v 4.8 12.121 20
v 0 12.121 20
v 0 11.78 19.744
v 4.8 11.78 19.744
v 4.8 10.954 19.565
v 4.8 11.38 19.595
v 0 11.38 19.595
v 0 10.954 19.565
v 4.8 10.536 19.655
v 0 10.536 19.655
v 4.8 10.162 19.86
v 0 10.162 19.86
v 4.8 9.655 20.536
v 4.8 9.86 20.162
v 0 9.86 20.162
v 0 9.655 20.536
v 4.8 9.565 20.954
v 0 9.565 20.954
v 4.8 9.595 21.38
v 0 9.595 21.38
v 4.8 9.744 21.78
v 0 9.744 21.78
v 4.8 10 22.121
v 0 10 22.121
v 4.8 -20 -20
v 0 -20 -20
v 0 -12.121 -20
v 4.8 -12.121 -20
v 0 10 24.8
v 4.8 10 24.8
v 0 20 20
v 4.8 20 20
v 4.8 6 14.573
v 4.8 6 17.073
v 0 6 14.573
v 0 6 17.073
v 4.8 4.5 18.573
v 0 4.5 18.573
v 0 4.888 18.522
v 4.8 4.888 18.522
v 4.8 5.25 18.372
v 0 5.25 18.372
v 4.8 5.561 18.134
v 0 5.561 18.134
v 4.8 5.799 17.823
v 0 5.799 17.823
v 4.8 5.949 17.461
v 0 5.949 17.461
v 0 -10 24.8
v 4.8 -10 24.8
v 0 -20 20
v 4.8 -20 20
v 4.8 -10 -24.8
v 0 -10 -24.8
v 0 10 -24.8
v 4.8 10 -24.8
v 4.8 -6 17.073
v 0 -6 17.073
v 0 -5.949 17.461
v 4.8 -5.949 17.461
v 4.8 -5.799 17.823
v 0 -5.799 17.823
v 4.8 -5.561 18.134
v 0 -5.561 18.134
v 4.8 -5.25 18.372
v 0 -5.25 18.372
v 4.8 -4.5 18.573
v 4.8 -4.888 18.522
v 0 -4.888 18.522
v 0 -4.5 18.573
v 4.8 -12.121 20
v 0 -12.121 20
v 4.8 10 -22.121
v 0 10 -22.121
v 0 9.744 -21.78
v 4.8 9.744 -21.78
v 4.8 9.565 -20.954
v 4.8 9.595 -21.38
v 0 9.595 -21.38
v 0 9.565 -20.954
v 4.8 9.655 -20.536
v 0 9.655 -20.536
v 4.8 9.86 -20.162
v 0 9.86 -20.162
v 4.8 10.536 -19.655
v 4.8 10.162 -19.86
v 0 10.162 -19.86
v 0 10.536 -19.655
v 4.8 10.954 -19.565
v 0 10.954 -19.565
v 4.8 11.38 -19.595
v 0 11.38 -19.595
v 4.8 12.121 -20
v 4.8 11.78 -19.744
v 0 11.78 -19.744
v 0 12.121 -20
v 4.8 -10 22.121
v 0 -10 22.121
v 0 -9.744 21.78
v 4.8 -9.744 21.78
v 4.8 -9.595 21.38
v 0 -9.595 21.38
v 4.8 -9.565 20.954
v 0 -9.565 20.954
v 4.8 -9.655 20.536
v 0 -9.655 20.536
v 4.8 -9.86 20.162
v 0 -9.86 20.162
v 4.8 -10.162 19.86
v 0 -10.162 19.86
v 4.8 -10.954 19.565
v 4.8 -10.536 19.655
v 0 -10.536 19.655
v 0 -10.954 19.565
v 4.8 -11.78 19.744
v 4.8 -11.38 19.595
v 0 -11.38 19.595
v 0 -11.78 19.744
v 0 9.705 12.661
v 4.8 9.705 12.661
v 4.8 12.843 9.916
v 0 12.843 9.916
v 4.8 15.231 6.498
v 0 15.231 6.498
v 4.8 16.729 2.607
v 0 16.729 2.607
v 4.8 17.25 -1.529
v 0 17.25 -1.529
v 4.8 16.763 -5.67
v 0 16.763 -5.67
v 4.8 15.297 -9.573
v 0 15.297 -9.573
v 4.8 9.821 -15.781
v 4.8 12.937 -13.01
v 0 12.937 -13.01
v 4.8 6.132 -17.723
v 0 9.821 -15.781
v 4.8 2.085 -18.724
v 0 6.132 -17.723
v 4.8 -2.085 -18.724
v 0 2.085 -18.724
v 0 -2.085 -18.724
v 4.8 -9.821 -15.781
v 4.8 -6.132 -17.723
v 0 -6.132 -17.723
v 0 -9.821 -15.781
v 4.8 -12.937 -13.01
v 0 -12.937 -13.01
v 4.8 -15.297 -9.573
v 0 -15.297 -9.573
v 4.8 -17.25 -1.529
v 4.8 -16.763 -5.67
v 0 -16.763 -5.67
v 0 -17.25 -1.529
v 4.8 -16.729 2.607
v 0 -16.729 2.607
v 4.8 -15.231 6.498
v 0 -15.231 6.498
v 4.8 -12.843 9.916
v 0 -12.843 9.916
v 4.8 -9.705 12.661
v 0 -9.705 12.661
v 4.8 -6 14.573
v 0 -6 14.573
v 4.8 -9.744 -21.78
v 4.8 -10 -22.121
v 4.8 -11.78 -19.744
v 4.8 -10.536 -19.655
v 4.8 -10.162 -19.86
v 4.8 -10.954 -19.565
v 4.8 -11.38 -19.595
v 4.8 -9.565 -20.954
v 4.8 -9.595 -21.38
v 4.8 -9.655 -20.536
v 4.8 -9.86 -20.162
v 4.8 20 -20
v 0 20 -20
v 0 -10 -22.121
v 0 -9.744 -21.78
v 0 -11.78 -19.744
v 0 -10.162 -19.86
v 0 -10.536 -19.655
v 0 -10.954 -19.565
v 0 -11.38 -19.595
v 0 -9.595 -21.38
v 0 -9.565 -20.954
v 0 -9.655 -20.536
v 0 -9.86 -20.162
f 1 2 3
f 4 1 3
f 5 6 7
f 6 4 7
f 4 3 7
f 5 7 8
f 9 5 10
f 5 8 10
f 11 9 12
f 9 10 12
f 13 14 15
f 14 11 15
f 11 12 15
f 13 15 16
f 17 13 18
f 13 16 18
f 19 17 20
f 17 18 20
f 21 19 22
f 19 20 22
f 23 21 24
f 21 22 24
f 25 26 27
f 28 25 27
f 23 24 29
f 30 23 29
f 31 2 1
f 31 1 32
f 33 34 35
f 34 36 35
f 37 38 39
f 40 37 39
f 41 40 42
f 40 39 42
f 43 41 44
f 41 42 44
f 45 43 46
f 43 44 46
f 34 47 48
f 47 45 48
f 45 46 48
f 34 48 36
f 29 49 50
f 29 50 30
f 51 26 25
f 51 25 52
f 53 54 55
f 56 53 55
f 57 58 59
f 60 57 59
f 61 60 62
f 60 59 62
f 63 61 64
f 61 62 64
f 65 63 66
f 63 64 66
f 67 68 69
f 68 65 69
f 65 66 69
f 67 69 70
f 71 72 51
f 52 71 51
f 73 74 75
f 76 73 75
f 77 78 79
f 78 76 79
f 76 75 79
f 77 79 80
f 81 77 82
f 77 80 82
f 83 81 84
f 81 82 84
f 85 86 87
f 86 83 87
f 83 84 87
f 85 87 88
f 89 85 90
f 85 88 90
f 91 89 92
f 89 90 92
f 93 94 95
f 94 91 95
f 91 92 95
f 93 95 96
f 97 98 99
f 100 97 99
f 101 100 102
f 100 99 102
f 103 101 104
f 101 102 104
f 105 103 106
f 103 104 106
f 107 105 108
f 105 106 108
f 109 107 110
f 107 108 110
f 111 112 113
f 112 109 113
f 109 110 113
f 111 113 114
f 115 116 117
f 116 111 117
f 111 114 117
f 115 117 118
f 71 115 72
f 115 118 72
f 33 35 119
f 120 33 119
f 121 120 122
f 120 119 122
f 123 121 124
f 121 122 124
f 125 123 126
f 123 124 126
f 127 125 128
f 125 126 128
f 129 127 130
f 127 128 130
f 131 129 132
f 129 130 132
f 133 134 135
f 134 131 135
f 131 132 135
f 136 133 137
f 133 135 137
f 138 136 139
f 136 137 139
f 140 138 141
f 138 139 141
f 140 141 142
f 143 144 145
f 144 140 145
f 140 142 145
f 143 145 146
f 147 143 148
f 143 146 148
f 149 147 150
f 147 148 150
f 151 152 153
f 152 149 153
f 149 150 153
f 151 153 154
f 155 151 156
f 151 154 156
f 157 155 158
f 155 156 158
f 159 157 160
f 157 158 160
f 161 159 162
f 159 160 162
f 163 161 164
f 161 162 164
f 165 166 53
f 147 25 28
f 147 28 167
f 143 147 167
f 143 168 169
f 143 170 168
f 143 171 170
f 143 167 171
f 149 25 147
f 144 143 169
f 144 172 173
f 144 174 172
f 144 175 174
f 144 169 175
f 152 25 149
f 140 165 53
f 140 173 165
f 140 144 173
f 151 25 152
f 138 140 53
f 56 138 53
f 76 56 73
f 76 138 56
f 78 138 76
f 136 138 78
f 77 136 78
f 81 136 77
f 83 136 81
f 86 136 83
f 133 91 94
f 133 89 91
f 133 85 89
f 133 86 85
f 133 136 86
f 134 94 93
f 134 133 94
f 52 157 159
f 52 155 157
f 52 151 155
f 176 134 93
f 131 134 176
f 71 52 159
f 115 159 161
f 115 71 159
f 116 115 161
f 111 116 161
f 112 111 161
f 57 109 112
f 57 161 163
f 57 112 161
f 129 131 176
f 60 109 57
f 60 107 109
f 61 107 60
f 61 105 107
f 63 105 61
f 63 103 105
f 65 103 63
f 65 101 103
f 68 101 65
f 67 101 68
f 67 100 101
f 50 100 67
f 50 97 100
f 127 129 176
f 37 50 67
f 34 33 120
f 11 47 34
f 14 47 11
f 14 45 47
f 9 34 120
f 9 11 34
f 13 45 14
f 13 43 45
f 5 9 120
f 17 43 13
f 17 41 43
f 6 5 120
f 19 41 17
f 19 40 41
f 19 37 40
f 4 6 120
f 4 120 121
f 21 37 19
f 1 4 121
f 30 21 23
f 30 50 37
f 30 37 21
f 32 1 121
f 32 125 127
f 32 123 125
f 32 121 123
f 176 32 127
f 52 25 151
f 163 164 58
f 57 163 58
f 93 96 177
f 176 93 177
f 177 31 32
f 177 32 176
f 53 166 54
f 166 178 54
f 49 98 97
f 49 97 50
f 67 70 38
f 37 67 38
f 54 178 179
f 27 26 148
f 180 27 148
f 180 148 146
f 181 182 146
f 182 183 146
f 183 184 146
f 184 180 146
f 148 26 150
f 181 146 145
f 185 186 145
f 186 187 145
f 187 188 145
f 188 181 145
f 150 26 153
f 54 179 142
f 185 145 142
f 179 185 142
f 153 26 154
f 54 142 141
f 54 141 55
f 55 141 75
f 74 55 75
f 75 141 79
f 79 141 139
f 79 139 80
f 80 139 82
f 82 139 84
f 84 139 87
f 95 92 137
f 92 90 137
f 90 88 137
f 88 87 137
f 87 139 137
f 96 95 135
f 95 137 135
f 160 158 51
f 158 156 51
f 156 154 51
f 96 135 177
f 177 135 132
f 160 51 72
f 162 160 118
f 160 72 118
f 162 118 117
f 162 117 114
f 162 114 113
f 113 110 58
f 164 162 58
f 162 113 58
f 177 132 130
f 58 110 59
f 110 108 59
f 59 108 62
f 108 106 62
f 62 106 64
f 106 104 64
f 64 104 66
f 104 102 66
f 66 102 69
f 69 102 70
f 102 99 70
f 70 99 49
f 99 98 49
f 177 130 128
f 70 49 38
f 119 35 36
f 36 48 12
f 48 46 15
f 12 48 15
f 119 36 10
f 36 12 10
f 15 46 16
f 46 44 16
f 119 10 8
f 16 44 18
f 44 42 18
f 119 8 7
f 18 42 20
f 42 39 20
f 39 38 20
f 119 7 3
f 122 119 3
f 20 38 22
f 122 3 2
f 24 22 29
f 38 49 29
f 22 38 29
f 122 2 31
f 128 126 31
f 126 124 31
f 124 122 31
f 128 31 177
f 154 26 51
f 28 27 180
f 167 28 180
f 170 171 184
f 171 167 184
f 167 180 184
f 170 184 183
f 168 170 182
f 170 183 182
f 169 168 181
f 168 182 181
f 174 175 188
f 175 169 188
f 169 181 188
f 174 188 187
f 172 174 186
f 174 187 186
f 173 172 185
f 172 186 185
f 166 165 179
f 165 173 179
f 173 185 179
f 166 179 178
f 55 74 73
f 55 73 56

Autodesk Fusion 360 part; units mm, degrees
sketch "Sketch1" plane through (0, 0, 0) normal (1, 0, 0) x (0, 1, 0)
  line L0 (-20, 20) -> (20, 20) construction
  line L1 (20, 20) -> (20, -20)
  line L2 (20, -20) -> (-20, -20) construction
  line L3 (-20, -20) -> (-20, 20)
  line L4 (0, 0) -> (0, 20) construction
  line L5 (0, 0) -> (20, 0) construction
  line L6 (0, 0) -> (0, -1.6) construction
  line L7 (0, 0) -> (0, -8.6) construction
  circle A0 centre (0, -8.6) radius 6
  circle A1 centre (0, -1.6) radius 18.4 construction
  circle A2 centre (0, -1.6) radius 15.5 construction
  line L8 (0, -1.6) -> (15.5, -1.6) construction
  circle A3 centre (15.5, -1.6) radius 1.5
  circle A4 centre (7.75, 11.8234) radius 1.5
  circle A5 centre (-7.75, 11.8234) radius 1.5
  circle A6 centre (-15.5, -1.6) radius 1.5
  circle A7 centre (-7.75, -15.0234) radius 1.5
  circle A8 centre (7.75, -15.0234) radius 1.5
  line L9 (-10, 20) -> (-10, 24.8) construction
  line L10 (-10, 24.8) -> (10, 24.8)
  line L11 (10, 24.8) -> (10, 20) construction
  line L12 (-10, -20) -> (-10, -24.8) construction
  line L13 (-10, -24.8) -> (10, -24.8)
  line L14 (10, -24.8) -> (10, -20) construction
  line L15 (-11.0607, -21.0607) -> (-10, -20) construction
  line L16 (11.0607, -21.0607) -> (10, -20) construction
  line L17 (-11.0607, 21.0607) -> (-10, 20) construction
  line L18 (11.0607, 21.0607) -> (10, 20) construction
  arc A9 (-12.1213, 20) -> (-10, 22.1213) centre (-11.0607, 21.0607) ccw
  arc A10 (-10, 22.1213) -> (-12.1213, 20) centre (-11.0607, 21.0607) ccw construction
  arc A11 (10, 22.1213) -> (12.1213, 20) centre (11.0607, 21.0607) ccw
  arc A12 (12.1213, 20) -> (10, 22.1213) centre (11.0607, 21.0607) ccw construction
  arc A13 (12.1213, -20) -> (10, -22.1213) centre (11.0607, -21.0607) ccw
  arc A14 (10, -22.1213) -> (12.1213, -20) centre (11.0607, -21.0607) ccw construction
  arc A15 (-10, -22.1213) -> (-12.1213, -20) centre (-11.0607, -21.0607) ccw
  arc A16 (-12.1213, -20) -> (-10, -22.1213) centre (-11.0607, -21.0607) ccw construction
  line L19 (-10, 22.1213) -> (-10, 24.8)
  line L20 (-12.1213, 20) -> (-20, 20)
  line L21 (10, 22.1213) -> (10, 24.8)
  line L22 (12.1213, 20) -> (20, 20)
  line L23 (10, -22.1213) -> (10, -24.8)
  line L24 (12.1213, -20) -> (20, -20)
  line L25 (-10, -22.1213) -> (-10, -24.8)
  line L26 (-12.1213, -20) -> (-20, -20)
  dimension "d61" = 40
  dimension "d62" = 40
  dimension "d63" = 1.6
  dimension "d65" = 12
  dimension "d66" = 36.8
  dimension "d67" = 31
  dimension "d68" = 3
  dimension "d70" = 360
  dimension "d71" = 4.8
  dimension "d72" = 20
  dimension "d73" = 10
  dimension "d74" = 4.8
  dimension "d75" = 20
  dimension "d76" = 10
  dimension "d77" = 3
  dimension "d78" = 1.5
  dimension "d79" = 45
  dimension "d80" = 3
  dimension "d81" = 1.5
  dimension "d83" = 45
  dimension "d84" = 3
  dimension "d85" = 3
  dimension "d86" = 1.5
  dimension "d87" = 45
  dimension "d88" = 1.5
  dimension "d89" = 45
  dimension "d90" = 7
extrude "Extrude1" add sketch "Sketch1" along normal blind 4.8

Autodesk Fusion 360 part; units mm, degrees
sketch "Sketch1" plane through (0, 0, 0) normal (1, 0, 0) x (0, 1, 0)
  line L0 (-20, 20) -> (20, 20) construction
  line L1 (20, 20) -> (20, -20)
  line L2 (20, -20) -> (-20, -20) construction
  line L3 (-20, -20) -> (-20, 20)
  line L4 (0, 0) -> (20, 0) construction
  line L5 (0, 0) -> (0, 20) construction
  line L6 (-10, 20) -> (-10, 24.8) construction
  line L7 (-10, 24.8) -> (10, 24.8)
  line L8 (10, 24.8) -> (10, 20) construction
  line L9 (-10, -20) -> (-10, -24.8) construction
  line L10 (-10, -24.8) -> (10, -24.8)
  line L11 (10, -24.8) -> (10, -20) construction
  line L12 (0, 0) -> (0, -1.6) construction
  line L13 (-6, 17.0729) -> (-6, 18.5729) construction
  line L14 (-6, 18.5729) -> (6, 18.5729) construction
  line L15 (6, 18.5729) -> (6, 17.0729) construction
  line L16 (-11.0607, 21.0607) -> (-10, 20) construction
  line L17 (11.0607, 21.0607) -> (10, 20) construction
  line L18 (11.0607, -21.0607) -> (10, -20) construction
  line L19 (-11.0607, -21.0607) -> (-10, -20) construction
  arc A0 (-6, 17.0729) -> (-4.5, 18.5729) centre (-4.5, 17.0729) ccw construction
  arc A1 (-4.5, 18.5729) -> (-6, 17.0729) centre (-4.5, 17.0729) ccw
  arc A2 (4.5, 18.5729) -> (6, 17.0729) centre (4.5, 17.0729) ccw construction
  arc A3 (6, 17.0729) -> (4.5, 18.5729) centre (4.5, 17.0729) ccw
  line L20 (-6, 14.5729) -> (-6, 17.0729)
  line L21 (6, 17.0729) -> (6, 14.5729)
  arc A4 (-6, 14.5729) -> (6, 14.5729) centre (0, -1.6) ccw
  arc A5 (6, 14.5729) -> (0, 15.65) centre (0, -1.6) ccw construction
  arc A6 (0, 15.65) -> (-6, 14.5729) centre (0, -1.6) ccw construction
  line L22 (-4.5, 18.5729) -> (4.5, 18.5729)
  arc A7 (-12.1213, 20) -> (-10, 22.1213) centre (-11.0607, 21.0607) ccw
  arc A8 (-10, 22.1213) -> (-12.1213, 20) centre (-11.0607, 21.0607) ccw construction
  arc A9 (10, 22.1213) -> (12.1213, 20) centre (11.0607, 21.0607) ccw
  arc A10 (12.1213, 20) -> (10, 22.1213) centre (11.0607, 21.0607) ccw construction
  arc A11 (-10, -22.1213) -> (-12.1213, -20) centre (-11.0607, -21.0607) ccw
  arc A12 (-12.1213, -20) -> (-10, -22.1213) centre (-11.0607, -21.0607) ccw construction
  arc A13 (12.1213, -20) -> (10, -22.1213) centre (11.0607, -21.0607) ccw
  arc A14 (10, -22.1213) -> (12.1213, -20) centre (11.0607, -21.0607) ccw construction
  line L23 (-10, 22.1213) -> (-10, 24.8)
  line L24 (10, 22.1213) -> (10, 24.8)
  line L25 (12.1213, 20) -> (20, 20)
  line L26 (-12.1213, 20) -> (-20, 20)
  line L27 (-20, -20) -> (-12.1213, -20)
  line L28 (-10, -22.1213) -> (-10, -24.8)
  line L29 (10, -22.1213) -> (10, -24.8)
  line L30 (12.1213, -20) -> (20, -20)
  point P0 (0, 18.5729)
  dimension "d39" = 40
  dimension "d40" = 40
  dimension "d41" = 4.8
  dimension "d42" = 20
  dimension "d43" = 10
  dimension "d44" = 4.8
  dimension "d45" = 20
  dimension "d46" = 10
  dimension "d47" = 1.6
  dimension "d48" = 34.5
  dimension "d49" = 4
  dimension "d51" = 3
  dimension "d52" = 1.5
  dimension "d53" = 45
  dimension "d54" = 3
  dimension "d55" = 3
  dimension "d56" = 3
  dimension "d57" = 1.5
  dimension "d58" = 45
  dimension "d59" = 3
  dimension "d60" = 1.5
  dimension "d61" = 45
  dimension "d62" = 3
  dimension "d63" = 1.5
  dimension "d64" = 45
  dimension "d65" = 12
extrude "Extrude1" add sketch "Sketch1" along normal blind 4.8
